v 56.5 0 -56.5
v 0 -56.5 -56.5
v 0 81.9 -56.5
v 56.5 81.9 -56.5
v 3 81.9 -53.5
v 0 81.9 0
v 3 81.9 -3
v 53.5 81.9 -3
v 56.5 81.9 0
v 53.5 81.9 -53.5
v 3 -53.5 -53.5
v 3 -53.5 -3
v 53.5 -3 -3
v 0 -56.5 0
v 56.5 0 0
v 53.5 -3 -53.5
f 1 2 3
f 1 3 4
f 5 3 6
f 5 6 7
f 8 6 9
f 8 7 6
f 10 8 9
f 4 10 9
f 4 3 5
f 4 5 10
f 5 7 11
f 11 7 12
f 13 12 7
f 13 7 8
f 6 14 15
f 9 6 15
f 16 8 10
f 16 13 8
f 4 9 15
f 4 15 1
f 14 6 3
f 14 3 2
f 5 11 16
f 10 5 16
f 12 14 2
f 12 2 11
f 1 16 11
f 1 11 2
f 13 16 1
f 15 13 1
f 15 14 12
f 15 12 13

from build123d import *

# Parameters (mm, degrees)
CROQUIS1_W              = 56.5
CROQUIS1_H              = 56.5
SALIENTE_EXTRUIR1_DEPTH = 81.9
SALIENTE_EXTRUIR2_DEPTH = 56.5
VACIADO4_T              = -3


with BuildPart() as part:
    # Croquis1 → Saliente-Extruir1 (new body)
    with BuildSketch(Plane(origin=(0, 0, 0), x_dir=(1, 0, 0), z_dir=(0, 1, 0))):
        with Locations((28.25, 28.25)):
            Rectangle(CROQUIS1_W, CROQUIS1_H)
    extrude(amount=SALIENTE_EXTRUIR1_DEPTH)

    # Croquis2 → Saliente-Extruir2 (add)
    with BuildSketch(Plane.XY):
        Polygon((0, 0), (0, -56.5), (56.5, 0), align=None)
    extrude(amount=-SALIENTE_EXTRUIR2_DEPTH)

    # Vaciado4
    vaciado4_openings = [part.faces().sort_by_distance(p)[0] for p in [
        (28.25, 81.9, -28.25),
        (28.25, -28.25, -28.25),
    ]]
    offset(amount=VACIADO4_T, openings=vaciado4_openings, kind=Kind.INTERSECTION)


solid = part.part
